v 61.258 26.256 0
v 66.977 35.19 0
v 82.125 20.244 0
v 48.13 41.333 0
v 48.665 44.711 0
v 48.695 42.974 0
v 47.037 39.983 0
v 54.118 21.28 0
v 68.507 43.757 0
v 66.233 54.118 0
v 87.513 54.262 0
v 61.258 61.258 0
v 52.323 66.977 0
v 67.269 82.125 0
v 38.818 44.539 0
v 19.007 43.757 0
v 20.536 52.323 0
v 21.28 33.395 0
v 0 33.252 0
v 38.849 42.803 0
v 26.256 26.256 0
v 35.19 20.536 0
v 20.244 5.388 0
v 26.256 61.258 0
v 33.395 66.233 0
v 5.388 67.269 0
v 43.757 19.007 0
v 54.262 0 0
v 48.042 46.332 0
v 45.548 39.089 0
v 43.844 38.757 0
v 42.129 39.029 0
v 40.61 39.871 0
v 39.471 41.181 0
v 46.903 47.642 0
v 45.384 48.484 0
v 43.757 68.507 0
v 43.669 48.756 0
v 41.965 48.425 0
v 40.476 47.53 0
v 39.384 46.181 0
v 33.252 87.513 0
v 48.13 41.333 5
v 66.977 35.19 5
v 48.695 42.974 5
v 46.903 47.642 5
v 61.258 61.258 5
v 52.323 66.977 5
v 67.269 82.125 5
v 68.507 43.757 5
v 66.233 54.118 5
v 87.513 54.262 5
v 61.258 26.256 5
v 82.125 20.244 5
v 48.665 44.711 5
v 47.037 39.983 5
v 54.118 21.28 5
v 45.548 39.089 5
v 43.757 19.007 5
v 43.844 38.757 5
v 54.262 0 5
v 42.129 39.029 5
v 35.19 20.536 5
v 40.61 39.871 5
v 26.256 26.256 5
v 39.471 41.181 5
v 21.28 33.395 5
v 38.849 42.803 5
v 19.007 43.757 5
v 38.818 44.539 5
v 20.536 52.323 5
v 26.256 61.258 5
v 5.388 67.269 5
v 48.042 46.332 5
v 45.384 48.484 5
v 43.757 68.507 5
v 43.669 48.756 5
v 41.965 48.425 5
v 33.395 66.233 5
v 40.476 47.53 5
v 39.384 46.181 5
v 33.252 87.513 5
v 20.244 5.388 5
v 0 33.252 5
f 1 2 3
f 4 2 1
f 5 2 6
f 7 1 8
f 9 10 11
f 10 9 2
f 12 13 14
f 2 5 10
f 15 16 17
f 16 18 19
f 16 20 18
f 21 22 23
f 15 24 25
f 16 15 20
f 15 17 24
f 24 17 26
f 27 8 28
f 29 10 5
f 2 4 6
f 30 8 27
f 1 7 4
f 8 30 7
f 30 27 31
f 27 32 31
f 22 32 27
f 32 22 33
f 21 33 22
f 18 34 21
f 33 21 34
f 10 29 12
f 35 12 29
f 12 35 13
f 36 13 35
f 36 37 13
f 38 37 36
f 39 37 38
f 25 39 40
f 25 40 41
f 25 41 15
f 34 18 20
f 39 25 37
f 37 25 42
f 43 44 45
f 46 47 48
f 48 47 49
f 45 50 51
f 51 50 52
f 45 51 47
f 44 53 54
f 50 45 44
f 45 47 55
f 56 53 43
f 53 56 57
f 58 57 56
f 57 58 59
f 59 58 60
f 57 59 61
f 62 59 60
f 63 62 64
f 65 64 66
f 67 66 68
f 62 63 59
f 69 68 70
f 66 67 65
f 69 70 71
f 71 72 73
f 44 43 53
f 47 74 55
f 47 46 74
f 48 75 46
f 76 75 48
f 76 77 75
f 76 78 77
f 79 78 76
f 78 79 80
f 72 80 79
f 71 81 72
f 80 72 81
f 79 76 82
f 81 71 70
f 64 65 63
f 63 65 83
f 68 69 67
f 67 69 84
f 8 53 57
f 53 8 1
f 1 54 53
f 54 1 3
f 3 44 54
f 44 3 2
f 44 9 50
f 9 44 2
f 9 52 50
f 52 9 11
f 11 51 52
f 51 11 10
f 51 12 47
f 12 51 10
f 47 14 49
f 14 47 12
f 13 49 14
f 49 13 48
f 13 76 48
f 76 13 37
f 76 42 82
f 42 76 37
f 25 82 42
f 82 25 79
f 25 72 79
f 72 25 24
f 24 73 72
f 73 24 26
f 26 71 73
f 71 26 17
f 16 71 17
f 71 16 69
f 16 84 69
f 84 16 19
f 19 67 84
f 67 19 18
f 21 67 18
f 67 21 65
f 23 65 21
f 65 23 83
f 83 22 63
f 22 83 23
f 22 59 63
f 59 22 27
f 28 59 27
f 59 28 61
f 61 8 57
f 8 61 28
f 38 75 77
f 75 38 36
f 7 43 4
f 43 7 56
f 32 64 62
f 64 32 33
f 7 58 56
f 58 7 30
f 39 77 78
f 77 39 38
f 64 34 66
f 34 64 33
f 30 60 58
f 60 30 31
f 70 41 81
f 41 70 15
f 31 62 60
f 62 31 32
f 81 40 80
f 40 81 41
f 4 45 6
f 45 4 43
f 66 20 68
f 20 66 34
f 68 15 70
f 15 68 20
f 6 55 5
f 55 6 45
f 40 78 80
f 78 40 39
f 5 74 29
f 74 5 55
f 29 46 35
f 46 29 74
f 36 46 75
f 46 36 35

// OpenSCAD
$fn = 32;

// ----------------------------------------------------------------------
// Star wheel: 8-point ratchet, R45
// ----------------------------------------------------------------------

// --- parameters (mm) ---
n_points = 8;             // number of points / teeth
r_out = 45;               // tip radius
r_in = 24.75;             // root radius
bore_r = 5;               // centre bore radius
plate_t = 5;              // plate thickness, Z (extrusion height)
bore_d = 10;              // centre bore diameter

profile = [[19.007, 43.757], [0, 33.252], [21.28, 33.395], [26.256, 26.256], [20.244, 5.388], [35.19, 20.536], [43.757, 19.007], [54.262, 0], [54.118, 21.28], [61.258, 26.256], [82.125, 20.244], [66.977, 35.19], [68.507, 43.757], [87.513, 54.262], [66.233, 54.118], [61.258, 61.258], [67.269, 82.125], [52.323, 66.977], [43.757, 68.507], [33.252, 87.513], [33.395, 66.233], [26.256, 61.258], [5.388, 67.269], [20.536, 52.323]];  // primary outline, 24 points, counter clockwise
void_1 = [[48.665, 44.711], [48.042, 46.332], [46.903, 47.642], [45.384, 48.484], [43.669, 48.756], [41.965, 48.425], [40.476, 47.53], [39.384, 46.181], [38.818, 44.539], [38.849, 42.803], [39.471, 41.181], [40.61, 39.871], [42.129, 39.029], [43.844, 38.757], [45.548, 39.089], [47.037, 39.983], [48.13, 41.333], [48.695, 42.974]];  // centre bore, 18 points

// --- the one profile operation ---
difference() {
  linear_extrude(height = plate_t) polygon(points = profile);
  translate([0, 0, -1])
    linear_extrude(height = plate_t + 2) polygon(points = void_1);
}
